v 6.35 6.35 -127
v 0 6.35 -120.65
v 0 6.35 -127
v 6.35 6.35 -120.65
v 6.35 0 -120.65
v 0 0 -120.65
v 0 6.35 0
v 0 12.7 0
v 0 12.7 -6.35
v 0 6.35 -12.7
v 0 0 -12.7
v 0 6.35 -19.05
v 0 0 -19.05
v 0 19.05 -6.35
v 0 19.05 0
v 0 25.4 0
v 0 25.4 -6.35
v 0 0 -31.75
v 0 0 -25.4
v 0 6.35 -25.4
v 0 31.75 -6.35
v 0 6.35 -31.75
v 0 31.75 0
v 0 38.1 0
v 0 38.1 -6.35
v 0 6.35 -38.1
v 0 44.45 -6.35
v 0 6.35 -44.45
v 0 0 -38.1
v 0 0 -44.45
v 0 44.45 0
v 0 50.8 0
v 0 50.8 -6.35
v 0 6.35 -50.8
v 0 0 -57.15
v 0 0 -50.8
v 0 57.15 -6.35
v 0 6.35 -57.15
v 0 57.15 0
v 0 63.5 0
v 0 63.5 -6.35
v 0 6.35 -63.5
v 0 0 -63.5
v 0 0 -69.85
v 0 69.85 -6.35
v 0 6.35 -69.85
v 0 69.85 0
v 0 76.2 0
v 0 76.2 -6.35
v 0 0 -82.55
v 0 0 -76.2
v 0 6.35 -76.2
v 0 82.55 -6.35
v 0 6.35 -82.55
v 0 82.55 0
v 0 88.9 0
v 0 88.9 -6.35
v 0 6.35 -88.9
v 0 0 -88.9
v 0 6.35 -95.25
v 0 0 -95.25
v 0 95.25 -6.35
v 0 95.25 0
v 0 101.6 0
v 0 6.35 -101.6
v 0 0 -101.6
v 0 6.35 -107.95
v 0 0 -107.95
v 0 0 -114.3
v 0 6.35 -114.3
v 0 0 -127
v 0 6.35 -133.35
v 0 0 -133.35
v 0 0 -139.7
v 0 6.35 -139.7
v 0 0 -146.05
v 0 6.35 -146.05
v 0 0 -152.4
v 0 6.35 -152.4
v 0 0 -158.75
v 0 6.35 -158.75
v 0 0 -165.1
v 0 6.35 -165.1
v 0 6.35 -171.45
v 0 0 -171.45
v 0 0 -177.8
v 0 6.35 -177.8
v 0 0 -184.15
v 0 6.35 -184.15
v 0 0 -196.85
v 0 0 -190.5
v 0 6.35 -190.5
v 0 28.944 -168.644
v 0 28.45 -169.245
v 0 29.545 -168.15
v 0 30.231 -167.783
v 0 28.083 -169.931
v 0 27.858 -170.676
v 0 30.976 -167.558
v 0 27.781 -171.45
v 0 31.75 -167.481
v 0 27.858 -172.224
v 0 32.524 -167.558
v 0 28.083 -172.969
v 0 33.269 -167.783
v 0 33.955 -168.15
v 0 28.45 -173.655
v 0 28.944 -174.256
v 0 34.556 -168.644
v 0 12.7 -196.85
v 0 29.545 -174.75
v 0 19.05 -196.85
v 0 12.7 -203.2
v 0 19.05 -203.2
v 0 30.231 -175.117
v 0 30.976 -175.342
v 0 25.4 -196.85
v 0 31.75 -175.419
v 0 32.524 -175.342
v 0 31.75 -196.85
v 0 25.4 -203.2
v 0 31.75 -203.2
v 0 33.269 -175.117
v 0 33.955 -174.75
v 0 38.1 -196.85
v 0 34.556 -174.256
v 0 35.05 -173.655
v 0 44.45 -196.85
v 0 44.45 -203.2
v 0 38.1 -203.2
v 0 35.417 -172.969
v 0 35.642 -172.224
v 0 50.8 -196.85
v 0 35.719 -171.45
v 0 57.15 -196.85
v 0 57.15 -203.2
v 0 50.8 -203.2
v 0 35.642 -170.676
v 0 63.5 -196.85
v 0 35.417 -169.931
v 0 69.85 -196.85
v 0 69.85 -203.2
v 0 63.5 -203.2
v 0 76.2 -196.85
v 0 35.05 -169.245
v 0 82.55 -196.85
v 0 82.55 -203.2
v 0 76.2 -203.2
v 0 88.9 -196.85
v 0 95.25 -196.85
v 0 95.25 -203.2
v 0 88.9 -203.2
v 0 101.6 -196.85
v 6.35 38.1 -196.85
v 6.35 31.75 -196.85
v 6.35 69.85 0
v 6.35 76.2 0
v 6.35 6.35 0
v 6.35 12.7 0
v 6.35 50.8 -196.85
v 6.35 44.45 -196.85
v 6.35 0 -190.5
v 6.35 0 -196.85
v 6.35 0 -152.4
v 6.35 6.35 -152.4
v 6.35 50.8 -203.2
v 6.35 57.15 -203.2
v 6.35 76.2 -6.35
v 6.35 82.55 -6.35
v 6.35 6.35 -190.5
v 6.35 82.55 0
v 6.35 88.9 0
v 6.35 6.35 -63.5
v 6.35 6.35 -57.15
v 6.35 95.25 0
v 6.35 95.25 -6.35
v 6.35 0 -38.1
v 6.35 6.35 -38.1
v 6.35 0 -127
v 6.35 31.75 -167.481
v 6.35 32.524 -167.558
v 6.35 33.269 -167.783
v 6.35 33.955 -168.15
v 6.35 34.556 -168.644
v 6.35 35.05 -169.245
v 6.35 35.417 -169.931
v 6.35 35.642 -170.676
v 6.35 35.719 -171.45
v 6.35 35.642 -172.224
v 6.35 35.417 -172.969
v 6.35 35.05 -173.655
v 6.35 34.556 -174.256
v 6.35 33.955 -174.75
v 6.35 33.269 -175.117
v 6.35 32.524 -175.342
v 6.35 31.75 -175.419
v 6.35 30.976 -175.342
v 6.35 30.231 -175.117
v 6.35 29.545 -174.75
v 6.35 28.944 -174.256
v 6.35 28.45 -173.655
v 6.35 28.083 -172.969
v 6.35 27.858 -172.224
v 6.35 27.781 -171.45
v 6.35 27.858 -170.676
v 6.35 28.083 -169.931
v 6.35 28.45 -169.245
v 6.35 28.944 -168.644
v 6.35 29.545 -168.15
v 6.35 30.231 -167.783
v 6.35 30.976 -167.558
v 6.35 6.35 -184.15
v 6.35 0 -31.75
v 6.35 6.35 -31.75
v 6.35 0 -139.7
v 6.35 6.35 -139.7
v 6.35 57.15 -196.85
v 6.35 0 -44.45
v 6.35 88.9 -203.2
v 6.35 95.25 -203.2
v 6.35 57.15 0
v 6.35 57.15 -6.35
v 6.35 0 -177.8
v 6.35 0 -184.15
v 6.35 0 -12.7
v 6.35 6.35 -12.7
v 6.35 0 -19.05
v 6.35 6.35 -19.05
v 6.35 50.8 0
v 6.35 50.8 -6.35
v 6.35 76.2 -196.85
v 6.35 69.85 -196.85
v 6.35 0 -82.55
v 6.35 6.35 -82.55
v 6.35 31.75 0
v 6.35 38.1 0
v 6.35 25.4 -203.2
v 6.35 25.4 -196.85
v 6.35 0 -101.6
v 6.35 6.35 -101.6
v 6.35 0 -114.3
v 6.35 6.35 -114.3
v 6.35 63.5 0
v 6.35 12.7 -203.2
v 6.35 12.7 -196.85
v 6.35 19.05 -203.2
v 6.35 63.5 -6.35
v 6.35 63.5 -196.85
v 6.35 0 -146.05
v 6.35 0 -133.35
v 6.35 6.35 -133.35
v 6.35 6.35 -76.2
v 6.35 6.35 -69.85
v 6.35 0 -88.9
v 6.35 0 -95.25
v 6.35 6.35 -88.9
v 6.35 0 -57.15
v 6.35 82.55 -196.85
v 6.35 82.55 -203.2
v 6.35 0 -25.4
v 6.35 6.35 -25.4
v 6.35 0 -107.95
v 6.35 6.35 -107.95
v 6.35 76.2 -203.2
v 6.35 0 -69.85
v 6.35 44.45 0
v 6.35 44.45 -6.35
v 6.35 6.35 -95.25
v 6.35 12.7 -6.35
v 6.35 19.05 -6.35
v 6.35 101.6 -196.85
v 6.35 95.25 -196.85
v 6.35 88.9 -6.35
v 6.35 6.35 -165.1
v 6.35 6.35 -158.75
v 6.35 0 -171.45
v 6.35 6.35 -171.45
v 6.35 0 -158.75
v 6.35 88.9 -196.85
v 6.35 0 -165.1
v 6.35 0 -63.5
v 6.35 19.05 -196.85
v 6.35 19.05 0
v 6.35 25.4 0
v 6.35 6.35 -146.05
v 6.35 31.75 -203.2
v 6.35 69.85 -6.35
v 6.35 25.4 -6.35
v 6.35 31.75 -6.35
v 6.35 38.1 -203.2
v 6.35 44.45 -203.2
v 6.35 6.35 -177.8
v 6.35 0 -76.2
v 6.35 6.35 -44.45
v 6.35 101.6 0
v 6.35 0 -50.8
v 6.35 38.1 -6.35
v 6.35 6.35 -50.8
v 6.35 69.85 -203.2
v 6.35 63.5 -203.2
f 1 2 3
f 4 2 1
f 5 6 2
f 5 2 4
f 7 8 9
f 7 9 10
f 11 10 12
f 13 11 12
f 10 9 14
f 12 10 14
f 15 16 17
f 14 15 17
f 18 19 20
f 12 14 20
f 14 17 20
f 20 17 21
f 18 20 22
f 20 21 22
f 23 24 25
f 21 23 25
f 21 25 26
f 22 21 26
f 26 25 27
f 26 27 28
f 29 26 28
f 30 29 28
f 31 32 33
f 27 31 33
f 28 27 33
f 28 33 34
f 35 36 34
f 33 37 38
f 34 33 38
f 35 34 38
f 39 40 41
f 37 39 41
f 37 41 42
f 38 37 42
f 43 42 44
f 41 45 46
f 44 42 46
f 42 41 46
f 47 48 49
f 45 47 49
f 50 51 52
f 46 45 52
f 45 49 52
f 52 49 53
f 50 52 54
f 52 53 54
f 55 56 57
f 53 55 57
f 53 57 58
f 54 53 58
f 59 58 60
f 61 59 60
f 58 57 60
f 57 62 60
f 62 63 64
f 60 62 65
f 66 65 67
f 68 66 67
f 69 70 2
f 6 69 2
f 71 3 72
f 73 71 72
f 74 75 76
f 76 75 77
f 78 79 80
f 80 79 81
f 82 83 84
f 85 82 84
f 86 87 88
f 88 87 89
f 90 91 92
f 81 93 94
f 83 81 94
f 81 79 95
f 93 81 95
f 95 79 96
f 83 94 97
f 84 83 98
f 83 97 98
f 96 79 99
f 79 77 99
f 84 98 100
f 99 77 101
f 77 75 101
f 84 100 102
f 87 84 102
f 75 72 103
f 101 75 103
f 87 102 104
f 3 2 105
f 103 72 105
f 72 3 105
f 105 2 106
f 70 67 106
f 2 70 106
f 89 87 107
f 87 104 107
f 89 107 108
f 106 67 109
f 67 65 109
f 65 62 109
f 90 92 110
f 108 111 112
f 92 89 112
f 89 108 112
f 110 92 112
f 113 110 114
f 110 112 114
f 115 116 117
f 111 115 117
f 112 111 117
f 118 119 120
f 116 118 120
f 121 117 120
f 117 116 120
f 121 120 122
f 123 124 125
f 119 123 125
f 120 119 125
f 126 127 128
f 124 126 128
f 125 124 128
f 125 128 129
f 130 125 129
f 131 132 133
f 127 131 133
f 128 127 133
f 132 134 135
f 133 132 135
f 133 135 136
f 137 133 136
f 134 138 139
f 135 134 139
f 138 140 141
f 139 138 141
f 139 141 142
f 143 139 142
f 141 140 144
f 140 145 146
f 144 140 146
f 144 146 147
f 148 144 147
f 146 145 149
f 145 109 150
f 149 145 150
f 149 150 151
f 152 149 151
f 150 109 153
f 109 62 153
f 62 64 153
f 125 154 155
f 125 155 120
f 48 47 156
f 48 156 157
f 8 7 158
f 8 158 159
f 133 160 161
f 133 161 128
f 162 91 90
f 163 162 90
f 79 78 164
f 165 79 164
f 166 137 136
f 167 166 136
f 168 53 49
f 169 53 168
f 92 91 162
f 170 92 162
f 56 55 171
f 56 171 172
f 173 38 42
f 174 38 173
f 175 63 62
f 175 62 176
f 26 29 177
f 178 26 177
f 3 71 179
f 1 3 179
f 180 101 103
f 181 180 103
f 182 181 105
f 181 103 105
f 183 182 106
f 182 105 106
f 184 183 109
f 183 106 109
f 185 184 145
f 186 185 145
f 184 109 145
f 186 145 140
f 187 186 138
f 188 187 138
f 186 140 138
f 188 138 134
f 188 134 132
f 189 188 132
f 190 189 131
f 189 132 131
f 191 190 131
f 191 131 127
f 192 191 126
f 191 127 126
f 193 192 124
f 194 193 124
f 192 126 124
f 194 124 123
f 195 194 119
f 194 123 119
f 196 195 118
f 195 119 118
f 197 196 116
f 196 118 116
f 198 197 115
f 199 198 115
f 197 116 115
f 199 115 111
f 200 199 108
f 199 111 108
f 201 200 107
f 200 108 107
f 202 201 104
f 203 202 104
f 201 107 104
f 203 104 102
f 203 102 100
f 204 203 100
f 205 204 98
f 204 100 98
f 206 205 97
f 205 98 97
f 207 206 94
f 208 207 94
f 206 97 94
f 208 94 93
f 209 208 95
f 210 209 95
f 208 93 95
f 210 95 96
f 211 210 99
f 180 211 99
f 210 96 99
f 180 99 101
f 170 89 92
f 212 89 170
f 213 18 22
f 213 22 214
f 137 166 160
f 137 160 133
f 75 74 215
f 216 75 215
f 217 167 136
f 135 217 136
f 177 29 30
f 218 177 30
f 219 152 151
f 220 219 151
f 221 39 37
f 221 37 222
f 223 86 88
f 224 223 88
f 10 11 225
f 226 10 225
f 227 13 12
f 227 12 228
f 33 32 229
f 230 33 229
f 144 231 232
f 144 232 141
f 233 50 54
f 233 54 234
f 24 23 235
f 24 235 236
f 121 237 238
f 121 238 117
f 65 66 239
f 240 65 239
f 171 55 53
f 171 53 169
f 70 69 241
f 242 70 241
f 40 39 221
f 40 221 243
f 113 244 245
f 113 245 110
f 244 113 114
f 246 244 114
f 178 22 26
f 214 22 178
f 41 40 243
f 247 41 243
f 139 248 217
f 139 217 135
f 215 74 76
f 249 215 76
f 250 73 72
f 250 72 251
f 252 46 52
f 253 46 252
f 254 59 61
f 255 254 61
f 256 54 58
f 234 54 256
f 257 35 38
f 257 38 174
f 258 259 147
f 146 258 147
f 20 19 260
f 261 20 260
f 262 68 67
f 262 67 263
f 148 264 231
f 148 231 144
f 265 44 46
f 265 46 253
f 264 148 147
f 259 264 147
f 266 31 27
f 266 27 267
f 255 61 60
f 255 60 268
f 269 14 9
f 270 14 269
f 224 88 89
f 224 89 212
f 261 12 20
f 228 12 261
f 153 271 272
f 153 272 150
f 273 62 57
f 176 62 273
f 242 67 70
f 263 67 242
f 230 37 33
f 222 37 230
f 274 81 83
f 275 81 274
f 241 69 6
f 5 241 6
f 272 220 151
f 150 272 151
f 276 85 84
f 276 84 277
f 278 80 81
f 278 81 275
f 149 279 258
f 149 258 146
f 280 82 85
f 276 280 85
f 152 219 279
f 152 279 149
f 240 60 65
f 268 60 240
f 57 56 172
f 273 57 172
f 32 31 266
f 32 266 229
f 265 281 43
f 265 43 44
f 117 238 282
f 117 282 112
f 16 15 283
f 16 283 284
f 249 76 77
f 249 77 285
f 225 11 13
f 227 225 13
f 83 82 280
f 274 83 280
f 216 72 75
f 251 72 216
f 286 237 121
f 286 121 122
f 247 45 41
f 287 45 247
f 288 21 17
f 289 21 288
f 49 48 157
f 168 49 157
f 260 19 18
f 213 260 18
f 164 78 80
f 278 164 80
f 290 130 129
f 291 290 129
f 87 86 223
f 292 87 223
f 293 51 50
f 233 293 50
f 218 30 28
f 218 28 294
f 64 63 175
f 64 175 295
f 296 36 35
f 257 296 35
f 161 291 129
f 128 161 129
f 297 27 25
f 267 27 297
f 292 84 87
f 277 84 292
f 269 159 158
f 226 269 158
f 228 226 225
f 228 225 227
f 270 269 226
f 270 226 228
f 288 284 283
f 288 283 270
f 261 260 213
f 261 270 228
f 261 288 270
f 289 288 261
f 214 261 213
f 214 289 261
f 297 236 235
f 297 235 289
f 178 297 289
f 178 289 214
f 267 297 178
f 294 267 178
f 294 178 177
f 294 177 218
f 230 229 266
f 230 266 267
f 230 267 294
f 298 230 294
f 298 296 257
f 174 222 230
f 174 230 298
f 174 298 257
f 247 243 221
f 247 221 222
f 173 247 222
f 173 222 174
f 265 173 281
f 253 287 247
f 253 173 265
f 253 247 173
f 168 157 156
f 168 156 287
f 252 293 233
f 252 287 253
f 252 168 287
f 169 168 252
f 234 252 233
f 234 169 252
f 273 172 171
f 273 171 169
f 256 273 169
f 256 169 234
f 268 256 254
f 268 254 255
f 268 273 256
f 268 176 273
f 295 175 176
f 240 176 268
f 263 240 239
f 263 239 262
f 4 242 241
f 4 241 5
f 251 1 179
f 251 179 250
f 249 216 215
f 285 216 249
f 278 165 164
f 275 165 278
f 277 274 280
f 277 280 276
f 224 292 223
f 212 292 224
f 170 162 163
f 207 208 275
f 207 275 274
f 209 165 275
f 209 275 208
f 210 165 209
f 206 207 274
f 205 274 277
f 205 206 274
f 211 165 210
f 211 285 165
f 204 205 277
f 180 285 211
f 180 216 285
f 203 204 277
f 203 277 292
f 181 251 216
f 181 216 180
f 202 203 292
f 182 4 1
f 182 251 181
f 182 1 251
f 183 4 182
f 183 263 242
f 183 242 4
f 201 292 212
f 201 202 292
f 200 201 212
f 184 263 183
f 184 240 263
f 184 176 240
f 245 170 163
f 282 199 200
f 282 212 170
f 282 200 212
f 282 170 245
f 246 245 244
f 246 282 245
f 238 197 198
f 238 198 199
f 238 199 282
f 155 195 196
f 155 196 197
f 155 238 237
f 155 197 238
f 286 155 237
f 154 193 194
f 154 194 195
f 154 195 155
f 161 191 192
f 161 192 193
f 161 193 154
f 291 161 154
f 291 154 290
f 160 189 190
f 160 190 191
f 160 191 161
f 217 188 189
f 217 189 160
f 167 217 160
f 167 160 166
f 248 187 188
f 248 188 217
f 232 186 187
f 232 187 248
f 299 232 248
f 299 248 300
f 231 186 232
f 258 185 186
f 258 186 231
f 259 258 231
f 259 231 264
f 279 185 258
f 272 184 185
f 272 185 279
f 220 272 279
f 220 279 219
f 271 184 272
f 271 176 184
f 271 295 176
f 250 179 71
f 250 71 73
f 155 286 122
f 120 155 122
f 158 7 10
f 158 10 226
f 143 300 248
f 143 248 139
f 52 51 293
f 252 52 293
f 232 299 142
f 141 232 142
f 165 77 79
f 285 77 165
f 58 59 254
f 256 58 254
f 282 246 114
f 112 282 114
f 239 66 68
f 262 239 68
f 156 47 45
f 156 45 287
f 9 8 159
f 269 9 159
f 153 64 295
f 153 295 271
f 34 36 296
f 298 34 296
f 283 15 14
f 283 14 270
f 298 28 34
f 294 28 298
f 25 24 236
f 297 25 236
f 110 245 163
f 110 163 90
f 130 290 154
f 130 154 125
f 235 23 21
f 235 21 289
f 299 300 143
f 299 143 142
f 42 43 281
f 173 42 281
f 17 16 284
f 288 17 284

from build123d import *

# Parameters (mm, degrees)
SKETCH1_W           = 203.2
SKETCH1_H           = 101.6
BOSS_EXTRUDE1_DEPTH = 6.35
SKETCH3_W           = 6.35
SKETCH3_H           = 12.7
CUT_EXTRUDE2_DEPTH  = 6.35
SKETCH4_W           = 6.35
SKETCH4_H           = 6.35
CUT_EXTRUDE3_DEPTH  = 6.35
LPATTERN1_COUNT     = 15
LPATTERN1_PITCH     = 12.7
SKETCH5_W           = 6.35
SKETCH5_H           = 6.35
CUT_EXTRUDE4_DEPTH  = 6.35
LPATTERN2_COUNT     = 7
LPATTERN2_PITCH     = 12.7
SKETCH6_W           = 6.35
SKETCH6_H           = 6.35
CUT_EXTRUDE5_DEPTH  = 6.35
SKETCH8_W           = 6.35
SKETCH8_H           = 6.35
CUT_EXTRUDE6_DEPTH  = 6.35
LPATTERN3_COUNT     = 7
LPATTERN3_PITCH     = 12.7
SKETCH9_R           = 3.96875
CUT_EXTRUDE7_DEPTH  = 6.35


with BuildPart() as part:
    # Sketch1 → Boss-Extrude1 (new body)
    with BuildSketch(Plane(origin=(0, 0, 0), x_dir=(0, 0, -1), z_dir=(1, 0, 0))):
        with Locations((101.6, 50.8)):
            Rectangle(SKETCH1_W, SKETCH1_H)
    extrude(amount=BOSS_EXTRUDE1_DEPTH)

    # Sketch3 → Cut-Extrude2 (cut)
    with BuildSketch(Plane.XZ):
        with Locations((3.175, -6.35)):
            Rectangle(SKETCH3_W, SKETCH3_H)
    extrude(amount=-CUT_EXTRUDE2_DEPTH, mode=Mode.SUBTRACT)

    # Sketch4 → Cut-Extrude3 (cut)
    with BuildSketch(Plane.XZ):
        with Locations((3.175, -22.225)):
            Rectangle(SKETCH4_W, SKETCH4_H)
    cut_extrude3 = extrude(amount=-CUT_EXTRUDE3_DEPTH, mode=Mode.SUBTRACT)

    # LPattern1: Cut-Extrude3 ×15
    with Locations(*[(0, 0, -i * LPATTERN1_PITCH) for i in range(1, LPATTERN1_COUNT)]):
        add(cut_extrude3, mode=Mode.SUBTRACT)

    # Sketch5 → Cut-Extrude4 (cut)
    with BuildSketch(Plane.XY):
        with Locations((3.175, 15.875)):
            Rectangle(SKETCH5_W, SKETCH5_H)
    cut_extrude4 = extrude(amount=-CUT_EXTRUDE4_DEPTH, mode=Mode.SUBTRACT)

    # LPattern2: Cut-Extrude4 ×7
    with Locations(*[(0, i * LPATTERN2_PITCH, 0) for i in range(1, LPATTERN2_COUNT)]):
        add(cut_extrude4, mode=Mode.SUBTRACT)

    # Sketch6 → Cut-Extrude5 (cut)
    with BuildSketch(Plane(origin=(0, 0, -203.2), x_dir=(-1, 0, 0), z_dir=(0, 0, -1))):
        with Locations((-3.175, 9.525)):
            Rectangle(SKETCH6_W, SKETCH6_H)
    extrude(amount=-CUT_EXTRUDE5_DEPTH, mode=Mode.SUBTRACT)

    # Sketch8 → Cut-Extrude6 (cut)
    with BuildSketch(Plane(origin=(0, 0, -203.2), x_dir=(-1, 0, 0), z_dir=(0, 0, -1))):
        with Locations((-3.175, 22.225)):
            Rectangle(SKETCH8_W, SKETCH8_H)
    cut_extrude6 = extrude(amount=-CUT_EXTRUDE6_DEPTH, mode=Mode.SUBTRACT)

    # LPattern3: Cut-Extrude6 ×7
    with Locations(*[(0, i * LPATTERN3_PITCH, 0) for i in range(1, LPATTERN3_COUNT)]):
        add(cut_extrude6, mode=Mode.SUBTRACT)

    # Sketch9 → Cut-Extrude7 (cut)
    with BuildSketch(Plane.ZY):
        with Locations((-171.45, 31.75)):
            Circle(SKETCH9_R)
    extrude(amount=-CUT_EXTRUDE7_DEPTH, mode=Mode.SUBTRACT)


solid = part.part
